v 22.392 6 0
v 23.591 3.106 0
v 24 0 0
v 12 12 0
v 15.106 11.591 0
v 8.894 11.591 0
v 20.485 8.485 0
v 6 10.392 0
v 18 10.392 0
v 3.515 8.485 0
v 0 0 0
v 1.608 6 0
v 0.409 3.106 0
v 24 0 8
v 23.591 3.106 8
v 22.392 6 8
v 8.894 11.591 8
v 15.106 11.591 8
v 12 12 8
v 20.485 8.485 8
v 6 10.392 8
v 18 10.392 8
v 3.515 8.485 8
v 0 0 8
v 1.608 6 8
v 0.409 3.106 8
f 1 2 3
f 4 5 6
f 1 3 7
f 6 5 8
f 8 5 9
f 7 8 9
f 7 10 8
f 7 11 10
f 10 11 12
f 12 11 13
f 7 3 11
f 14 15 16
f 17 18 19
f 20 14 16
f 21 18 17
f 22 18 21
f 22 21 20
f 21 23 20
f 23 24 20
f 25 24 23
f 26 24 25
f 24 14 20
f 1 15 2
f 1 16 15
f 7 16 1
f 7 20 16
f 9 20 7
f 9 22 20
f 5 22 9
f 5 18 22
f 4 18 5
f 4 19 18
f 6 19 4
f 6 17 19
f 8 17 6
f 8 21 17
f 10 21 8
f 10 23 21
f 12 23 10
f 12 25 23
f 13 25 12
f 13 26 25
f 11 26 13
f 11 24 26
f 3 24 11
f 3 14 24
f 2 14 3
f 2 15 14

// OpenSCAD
$fn = 32;

// ----------------------------------------------------------------------
// Key bar: woodruff key, 8 mm thick
// ----------------------------------------------------------------------

// --- parameters (mm) ---
profile_height = 8;       // extrusion height
profile_points = 13;      // points of the closed outline

profile = [[24, 0], [23.591, 3.106], [22.392, 6], [20.485, 8.485], [18, 10.392], [15.106, 11.591], [12, 12], [8.894, 11.591], [6, 10.392], [3.515, 8.485], [1.608, 6], [0.409, 3.106], [0, 0]];  // single closed polygon, 13 points, counter clockwise

// --- the one profile operation ---
linear_extrude(height = profile_height) polygon(points = profile);
